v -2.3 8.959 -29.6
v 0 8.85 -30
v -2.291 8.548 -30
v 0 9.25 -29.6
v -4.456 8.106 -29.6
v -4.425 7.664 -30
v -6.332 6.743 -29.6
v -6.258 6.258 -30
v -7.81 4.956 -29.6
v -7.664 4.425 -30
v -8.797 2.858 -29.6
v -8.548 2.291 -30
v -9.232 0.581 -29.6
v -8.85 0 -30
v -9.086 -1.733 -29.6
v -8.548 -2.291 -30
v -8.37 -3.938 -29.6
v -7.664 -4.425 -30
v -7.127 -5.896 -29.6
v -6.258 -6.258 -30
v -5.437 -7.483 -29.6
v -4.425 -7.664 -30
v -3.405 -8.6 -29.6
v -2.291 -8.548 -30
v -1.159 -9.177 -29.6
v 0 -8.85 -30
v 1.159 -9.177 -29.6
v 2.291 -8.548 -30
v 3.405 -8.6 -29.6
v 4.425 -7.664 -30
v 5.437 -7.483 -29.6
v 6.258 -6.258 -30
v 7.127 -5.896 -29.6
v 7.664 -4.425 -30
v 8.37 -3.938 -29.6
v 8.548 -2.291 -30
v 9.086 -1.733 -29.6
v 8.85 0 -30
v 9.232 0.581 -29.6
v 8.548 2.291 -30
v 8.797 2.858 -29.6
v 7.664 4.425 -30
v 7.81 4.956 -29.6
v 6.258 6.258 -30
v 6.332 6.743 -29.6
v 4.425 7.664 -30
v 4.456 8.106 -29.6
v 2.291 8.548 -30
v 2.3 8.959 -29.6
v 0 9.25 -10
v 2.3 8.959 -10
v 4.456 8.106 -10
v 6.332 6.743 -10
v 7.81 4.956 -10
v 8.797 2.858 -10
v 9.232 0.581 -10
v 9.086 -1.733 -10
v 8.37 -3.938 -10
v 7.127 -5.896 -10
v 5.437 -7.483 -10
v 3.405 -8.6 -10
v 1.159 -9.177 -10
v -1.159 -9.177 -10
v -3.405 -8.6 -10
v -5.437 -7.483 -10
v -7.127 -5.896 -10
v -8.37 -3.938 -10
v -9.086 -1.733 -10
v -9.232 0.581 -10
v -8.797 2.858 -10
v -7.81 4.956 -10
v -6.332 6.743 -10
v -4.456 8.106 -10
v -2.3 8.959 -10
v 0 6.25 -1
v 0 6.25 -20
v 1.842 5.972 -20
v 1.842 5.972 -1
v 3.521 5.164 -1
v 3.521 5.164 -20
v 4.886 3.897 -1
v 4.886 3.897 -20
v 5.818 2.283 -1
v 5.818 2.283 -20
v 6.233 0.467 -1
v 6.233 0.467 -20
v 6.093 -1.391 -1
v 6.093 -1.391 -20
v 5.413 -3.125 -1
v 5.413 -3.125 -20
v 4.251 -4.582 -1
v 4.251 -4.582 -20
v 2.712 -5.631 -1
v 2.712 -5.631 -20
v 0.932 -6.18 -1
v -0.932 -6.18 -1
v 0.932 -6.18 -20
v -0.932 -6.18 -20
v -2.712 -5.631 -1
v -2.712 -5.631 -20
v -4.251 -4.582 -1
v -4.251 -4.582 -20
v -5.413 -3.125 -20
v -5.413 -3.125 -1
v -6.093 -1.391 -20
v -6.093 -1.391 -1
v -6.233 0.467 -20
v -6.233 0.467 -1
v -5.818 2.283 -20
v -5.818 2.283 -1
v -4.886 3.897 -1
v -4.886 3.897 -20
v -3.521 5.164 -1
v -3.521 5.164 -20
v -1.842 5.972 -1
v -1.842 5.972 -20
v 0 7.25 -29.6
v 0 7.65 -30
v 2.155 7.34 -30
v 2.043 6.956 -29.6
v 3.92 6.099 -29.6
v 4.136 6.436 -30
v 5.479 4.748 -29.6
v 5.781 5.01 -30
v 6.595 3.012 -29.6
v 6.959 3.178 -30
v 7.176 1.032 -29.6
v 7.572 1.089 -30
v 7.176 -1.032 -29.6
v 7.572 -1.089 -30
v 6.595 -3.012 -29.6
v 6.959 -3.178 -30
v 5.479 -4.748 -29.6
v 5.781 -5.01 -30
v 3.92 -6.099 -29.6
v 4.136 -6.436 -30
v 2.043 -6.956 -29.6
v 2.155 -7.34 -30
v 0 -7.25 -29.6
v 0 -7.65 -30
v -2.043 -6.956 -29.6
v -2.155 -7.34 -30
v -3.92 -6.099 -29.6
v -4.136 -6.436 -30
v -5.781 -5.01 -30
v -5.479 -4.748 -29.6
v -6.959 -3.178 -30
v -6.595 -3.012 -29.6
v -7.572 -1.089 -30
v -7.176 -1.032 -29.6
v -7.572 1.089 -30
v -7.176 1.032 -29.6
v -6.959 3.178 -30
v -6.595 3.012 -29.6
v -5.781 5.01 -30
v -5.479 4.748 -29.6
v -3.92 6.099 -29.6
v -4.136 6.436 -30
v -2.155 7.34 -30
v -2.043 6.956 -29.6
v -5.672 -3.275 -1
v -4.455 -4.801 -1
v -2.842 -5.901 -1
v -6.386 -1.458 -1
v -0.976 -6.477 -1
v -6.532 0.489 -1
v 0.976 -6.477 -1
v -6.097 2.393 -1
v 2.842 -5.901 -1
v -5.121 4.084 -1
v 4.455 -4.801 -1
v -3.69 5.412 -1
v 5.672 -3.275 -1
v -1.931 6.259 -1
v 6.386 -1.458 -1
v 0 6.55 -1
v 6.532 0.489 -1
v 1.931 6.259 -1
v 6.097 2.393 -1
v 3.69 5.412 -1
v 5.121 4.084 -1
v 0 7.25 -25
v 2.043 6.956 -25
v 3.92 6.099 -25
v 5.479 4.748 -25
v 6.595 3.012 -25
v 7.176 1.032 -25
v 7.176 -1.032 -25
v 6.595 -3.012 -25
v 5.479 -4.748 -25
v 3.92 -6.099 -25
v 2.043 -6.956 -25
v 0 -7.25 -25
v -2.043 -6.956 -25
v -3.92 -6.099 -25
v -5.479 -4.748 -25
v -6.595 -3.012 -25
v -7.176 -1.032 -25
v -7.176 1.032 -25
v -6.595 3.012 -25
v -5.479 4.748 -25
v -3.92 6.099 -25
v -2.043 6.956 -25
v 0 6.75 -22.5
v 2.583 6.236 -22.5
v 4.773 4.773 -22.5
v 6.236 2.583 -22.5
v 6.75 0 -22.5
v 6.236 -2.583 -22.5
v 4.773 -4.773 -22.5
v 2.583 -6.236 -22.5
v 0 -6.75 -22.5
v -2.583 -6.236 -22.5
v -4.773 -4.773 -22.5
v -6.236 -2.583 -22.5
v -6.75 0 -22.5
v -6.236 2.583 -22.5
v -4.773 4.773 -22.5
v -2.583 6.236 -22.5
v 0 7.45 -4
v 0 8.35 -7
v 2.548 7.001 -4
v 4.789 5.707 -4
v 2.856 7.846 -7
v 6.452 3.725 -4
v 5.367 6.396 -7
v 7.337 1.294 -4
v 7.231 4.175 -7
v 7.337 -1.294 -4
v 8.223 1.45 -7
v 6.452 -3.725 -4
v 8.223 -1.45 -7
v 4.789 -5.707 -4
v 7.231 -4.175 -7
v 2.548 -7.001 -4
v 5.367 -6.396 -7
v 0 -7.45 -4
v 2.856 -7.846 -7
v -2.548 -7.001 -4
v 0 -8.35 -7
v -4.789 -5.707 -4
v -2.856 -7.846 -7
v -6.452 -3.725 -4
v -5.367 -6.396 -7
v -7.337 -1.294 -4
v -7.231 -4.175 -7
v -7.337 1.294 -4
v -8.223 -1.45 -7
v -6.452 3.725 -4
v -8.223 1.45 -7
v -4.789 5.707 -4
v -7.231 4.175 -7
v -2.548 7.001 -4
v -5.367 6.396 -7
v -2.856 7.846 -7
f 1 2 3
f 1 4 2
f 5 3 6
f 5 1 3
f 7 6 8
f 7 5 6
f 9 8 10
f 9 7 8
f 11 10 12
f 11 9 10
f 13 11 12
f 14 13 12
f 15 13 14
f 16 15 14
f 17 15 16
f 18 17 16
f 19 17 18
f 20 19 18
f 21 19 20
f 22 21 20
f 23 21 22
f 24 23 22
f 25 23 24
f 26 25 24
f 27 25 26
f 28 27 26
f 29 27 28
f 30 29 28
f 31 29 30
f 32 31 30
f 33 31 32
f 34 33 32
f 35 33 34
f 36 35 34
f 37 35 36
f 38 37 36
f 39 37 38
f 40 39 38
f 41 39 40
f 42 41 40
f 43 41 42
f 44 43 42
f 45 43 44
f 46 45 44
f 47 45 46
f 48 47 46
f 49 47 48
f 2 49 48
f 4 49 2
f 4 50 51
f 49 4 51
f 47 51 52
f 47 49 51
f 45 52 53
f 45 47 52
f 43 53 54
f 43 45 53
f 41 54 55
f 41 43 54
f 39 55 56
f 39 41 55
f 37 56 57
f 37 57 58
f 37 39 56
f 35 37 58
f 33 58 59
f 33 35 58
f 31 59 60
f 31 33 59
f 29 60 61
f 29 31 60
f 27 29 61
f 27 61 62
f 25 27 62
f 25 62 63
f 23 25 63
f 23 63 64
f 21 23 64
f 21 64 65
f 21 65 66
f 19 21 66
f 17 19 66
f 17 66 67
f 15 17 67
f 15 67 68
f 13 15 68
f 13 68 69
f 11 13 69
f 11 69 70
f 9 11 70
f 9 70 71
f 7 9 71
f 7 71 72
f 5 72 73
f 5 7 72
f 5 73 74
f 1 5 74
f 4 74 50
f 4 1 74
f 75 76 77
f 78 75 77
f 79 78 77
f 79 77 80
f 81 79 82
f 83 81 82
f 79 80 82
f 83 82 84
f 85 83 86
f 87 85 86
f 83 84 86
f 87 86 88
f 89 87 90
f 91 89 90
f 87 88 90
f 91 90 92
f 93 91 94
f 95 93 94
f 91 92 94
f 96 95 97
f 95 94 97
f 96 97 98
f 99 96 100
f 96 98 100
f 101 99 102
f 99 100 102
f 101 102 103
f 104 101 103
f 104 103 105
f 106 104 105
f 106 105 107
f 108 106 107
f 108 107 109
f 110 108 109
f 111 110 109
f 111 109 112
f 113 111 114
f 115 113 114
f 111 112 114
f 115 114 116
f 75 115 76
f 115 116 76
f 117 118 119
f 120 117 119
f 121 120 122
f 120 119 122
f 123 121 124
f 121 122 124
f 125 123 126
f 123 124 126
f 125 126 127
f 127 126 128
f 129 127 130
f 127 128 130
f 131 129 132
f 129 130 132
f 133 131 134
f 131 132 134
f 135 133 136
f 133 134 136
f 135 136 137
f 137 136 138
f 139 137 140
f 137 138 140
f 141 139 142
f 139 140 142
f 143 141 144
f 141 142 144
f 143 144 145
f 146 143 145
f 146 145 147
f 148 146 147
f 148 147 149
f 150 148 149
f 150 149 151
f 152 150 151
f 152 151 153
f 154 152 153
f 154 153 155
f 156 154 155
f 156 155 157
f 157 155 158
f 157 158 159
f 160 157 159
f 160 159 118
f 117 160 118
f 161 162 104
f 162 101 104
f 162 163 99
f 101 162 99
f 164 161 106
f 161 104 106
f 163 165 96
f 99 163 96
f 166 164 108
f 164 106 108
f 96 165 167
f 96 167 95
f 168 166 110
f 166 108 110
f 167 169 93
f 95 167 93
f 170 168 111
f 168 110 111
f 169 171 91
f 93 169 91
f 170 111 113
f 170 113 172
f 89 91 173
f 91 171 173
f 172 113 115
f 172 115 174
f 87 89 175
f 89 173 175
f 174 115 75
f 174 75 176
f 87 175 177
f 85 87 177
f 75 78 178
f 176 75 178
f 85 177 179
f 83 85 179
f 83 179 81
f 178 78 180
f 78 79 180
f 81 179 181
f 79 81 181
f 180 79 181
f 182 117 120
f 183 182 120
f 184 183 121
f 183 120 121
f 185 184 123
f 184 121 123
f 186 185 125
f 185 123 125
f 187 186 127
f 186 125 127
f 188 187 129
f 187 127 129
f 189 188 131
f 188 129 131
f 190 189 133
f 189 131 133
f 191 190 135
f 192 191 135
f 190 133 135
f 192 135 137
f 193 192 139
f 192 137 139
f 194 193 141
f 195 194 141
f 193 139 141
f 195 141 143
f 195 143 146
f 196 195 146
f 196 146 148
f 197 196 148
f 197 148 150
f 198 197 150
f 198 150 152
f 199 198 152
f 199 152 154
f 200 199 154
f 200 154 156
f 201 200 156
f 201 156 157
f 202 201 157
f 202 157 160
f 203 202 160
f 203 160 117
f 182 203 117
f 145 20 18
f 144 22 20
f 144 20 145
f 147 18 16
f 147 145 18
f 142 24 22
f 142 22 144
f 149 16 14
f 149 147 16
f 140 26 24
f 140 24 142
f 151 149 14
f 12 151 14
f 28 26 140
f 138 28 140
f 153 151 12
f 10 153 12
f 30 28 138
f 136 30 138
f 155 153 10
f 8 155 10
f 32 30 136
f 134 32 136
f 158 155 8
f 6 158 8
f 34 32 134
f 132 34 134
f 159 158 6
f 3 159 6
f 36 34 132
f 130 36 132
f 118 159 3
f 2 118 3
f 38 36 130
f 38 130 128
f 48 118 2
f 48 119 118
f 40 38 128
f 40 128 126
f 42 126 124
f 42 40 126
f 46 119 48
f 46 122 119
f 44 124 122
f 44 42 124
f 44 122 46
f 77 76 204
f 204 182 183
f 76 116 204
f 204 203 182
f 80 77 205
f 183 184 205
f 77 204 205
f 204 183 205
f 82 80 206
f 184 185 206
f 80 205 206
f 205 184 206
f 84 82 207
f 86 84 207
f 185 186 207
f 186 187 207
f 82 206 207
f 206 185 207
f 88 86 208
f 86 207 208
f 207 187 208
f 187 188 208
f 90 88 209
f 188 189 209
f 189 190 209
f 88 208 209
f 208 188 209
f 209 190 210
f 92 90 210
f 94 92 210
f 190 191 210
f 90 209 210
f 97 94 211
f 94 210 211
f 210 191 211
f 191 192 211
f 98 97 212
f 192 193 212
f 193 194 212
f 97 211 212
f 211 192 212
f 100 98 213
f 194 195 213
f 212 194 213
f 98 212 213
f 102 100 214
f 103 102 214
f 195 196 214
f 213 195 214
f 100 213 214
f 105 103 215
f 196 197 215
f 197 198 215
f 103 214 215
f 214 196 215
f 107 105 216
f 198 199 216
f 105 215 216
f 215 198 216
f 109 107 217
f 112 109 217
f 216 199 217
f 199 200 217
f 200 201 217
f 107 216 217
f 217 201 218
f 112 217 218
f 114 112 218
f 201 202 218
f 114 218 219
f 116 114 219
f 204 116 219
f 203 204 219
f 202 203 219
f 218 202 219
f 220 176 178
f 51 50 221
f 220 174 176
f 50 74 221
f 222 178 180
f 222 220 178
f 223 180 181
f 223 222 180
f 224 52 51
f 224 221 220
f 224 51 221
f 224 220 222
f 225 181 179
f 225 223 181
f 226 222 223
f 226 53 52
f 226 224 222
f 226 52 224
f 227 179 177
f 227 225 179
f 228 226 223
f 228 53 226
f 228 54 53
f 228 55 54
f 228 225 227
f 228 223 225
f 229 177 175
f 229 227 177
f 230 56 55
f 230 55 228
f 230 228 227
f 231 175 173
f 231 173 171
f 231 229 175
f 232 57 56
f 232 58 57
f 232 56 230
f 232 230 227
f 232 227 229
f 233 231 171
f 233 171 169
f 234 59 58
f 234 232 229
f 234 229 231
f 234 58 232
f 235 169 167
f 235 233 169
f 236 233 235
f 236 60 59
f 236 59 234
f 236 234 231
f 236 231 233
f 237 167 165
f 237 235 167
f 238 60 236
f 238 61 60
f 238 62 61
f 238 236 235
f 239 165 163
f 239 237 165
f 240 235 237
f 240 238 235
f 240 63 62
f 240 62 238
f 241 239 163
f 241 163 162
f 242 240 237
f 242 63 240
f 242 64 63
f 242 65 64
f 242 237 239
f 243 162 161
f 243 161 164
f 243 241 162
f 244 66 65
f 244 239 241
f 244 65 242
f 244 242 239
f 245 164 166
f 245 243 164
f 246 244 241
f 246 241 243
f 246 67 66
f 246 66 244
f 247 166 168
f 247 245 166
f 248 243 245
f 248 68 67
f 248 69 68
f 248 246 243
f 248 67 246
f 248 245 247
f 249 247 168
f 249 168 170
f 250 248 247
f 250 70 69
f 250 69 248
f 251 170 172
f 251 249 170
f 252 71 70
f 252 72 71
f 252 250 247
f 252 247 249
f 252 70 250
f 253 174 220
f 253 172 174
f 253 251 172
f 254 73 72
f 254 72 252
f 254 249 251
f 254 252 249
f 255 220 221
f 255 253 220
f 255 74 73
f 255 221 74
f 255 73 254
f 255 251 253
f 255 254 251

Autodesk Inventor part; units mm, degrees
ref_plane "YZ Plane" through (0, 0, 0) normal (1, 0, 0) x (0, 1, 0)
ref_plane "XZ Plane" through (0, 0, 0) normal (0, 1, 0) x (-1, 0, 0)
ref_plane "XY Plane" through (0, 0, 0) normal (0, 0, 1) x (1, 0, 0)
sketch "Esquisse1" plane through (0, 0, 0) normal (1, 0, 0) x (0, 1, 0)
  line L0 (6.55, -1) -> (6.25, -1)
  line L1 (6.25, -1) -> (6.25, -20)
  line L2 (0, 0) -> (0, -28.3478)
  line L3 (6.55, -1) -> (9.25, -10)
  line L4 (6.55, -1) -> (6.25, 0) construction
  line L5 (9.25, -10) -> (9.25, -30)
  line L6 (6.25, -20) -> (7.25, -25)
  line L7 (7.25, -25) -> (7.25, -30)
  line L8 (7.25, -30) -> (9.25, -30)
  dimension "d0" = 12.5
  dimension "d1" = 1
  dimension "d2" = 3
  dimension "d3" = 10
  dimension "d4" = 2
  dimension "d5" = 30
  dimension "d6" = 5
  dimension "d7" = 5
  dimension "d9" = 18.5
revolve "Révolution1" add sketch "Esquisse1" angle 360 about axis through (0, 0, 0) along (0, 0, -1)
chamfer "Chanfrein1" distance 0.4 angle 45 2 edges at (0, -7.25, -30) (0, -9.25, -30)
properties part number "cardridge"
